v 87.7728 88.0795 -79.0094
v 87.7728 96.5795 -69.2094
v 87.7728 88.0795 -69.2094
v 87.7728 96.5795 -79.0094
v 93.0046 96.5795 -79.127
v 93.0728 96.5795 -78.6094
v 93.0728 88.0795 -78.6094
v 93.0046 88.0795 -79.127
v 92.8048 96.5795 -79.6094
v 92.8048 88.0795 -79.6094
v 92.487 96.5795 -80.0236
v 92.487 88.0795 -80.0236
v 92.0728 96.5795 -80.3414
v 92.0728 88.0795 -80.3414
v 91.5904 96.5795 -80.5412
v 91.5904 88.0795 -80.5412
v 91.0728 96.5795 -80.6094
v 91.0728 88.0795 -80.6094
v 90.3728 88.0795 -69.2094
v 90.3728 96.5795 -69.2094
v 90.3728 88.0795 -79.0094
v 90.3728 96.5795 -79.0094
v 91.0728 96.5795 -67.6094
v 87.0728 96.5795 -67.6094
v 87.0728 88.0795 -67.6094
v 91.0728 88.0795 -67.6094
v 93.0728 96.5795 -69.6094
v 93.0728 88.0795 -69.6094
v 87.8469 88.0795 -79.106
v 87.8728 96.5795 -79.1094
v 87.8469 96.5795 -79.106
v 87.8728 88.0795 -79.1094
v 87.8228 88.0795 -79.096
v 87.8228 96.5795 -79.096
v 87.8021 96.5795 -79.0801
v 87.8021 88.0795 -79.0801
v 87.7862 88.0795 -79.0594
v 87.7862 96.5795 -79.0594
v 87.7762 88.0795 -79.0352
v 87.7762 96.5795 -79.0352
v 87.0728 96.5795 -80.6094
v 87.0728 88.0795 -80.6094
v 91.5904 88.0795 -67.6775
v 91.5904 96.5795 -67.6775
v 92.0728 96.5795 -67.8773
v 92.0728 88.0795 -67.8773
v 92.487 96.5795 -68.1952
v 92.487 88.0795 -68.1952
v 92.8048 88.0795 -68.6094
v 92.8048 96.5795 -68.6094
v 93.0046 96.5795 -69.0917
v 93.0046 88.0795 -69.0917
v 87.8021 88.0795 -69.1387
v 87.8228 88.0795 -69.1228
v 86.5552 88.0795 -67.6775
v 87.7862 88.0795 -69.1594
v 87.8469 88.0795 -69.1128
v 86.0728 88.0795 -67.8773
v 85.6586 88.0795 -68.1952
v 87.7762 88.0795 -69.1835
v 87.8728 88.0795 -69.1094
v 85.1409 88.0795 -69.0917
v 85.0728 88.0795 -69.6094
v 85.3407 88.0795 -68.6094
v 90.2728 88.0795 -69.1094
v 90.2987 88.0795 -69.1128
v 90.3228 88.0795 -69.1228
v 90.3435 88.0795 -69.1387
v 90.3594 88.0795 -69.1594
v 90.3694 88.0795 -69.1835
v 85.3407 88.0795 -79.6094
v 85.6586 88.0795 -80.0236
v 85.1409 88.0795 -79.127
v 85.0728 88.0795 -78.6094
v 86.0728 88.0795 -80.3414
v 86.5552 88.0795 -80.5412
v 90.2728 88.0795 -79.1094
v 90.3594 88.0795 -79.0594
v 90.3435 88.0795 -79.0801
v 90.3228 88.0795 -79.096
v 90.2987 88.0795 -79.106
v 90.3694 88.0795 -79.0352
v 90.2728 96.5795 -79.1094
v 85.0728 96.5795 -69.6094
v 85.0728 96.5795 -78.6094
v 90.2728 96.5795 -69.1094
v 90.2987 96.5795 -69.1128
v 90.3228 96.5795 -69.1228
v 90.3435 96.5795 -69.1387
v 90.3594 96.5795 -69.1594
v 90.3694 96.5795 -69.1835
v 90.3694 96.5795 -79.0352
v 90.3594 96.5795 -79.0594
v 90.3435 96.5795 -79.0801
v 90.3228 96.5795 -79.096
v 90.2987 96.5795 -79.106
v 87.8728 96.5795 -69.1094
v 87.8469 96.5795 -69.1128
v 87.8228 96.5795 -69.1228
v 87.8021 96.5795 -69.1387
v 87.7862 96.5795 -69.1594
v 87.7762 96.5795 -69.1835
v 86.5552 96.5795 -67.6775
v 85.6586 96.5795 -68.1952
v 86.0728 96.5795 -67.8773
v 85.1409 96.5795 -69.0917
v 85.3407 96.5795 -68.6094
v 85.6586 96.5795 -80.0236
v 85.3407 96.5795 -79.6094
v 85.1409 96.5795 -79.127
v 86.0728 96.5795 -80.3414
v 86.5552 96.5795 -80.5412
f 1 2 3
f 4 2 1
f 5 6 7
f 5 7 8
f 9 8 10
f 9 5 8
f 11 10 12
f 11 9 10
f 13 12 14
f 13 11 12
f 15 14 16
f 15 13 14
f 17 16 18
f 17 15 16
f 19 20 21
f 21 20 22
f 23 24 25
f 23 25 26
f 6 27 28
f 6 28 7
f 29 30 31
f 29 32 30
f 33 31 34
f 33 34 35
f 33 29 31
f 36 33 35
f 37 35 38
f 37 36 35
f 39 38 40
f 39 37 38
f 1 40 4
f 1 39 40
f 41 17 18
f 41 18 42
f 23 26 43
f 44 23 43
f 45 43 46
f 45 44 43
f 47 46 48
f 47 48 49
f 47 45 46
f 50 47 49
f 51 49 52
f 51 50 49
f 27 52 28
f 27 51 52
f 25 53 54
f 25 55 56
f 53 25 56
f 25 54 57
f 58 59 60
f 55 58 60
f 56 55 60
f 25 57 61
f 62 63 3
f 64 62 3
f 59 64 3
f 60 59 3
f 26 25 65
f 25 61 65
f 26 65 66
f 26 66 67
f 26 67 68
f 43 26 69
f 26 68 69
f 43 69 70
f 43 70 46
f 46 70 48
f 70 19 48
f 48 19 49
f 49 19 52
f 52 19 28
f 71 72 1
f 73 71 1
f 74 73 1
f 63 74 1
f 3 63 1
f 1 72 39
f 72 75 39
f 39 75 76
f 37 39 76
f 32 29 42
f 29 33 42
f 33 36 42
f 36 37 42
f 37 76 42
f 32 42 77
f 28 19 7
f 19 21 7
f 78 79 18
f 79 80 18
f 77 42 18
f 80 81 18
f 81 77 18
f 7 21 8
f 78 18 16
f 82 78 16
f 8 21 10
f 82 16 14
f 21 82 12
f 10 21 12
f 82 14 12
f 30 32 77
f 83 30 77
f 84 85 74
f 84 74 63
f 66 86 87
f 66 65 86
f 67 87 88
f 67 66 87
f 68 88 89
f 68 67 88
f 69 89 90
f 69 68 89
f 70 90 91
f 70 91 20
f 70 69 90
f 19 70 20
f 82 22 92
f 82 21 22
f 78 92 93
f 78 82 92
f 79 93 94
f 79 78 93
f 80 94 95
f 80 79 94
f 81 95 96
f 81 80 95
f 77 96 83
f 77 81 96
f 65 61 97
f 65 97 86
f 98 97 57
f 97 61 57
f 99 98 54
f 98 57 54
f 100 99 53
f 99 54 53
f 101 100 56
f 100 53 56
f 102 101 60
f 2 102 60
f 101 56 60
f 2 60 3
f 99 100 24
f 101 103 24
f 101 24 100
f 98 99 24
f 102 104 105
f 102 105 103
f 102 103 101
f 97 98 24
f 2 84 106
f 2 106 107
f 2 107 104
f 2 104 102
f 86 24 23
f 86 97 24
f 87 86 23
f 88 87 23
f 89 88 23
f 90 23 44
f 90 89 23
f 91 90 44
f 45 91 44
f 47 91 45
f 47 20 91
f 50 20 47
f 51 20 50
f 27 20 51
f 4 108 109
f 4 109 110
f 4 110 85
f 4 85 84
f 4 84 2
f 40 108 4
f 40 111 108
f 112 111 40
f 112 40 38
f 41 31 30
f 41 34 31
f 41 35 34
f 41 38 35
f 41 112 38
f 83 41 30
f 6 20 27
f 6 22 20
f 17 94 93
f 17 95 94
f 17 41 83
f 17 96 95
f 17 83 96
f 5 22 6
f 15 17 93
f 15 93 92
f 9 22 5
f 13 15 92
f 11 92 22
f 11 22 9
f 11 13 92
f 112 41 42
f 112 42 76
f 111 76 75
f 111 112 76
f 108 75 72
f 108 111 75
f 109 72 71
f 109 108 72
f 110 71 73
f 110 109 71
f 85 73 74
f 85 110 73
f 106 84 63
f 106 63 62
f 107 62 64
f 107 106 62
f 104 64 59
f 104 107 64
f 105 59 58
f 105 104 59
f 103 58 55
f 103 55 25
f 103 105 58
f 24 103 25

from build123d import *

# Parameters (mm, degrees)
COIL_START = -0.7
SKETCH1_W  = 2.6
SKETCH1_H  = 10
COIL_DEPTH = 8.5
FILLET1_R  = 0.1


with BuildPart() as part:
    # Sketch1 → Coil (new body)
    with BuildSketch(Plane(origin=(0, 97.279475289, 0), x_dir=(1, 0, 0), z_dir=(0, 1, 0)).offset(COIL_START)):
        with BuildLine():
            Line((87.072792821, 67.609367759), (91.072792821, 67.609367759))
            ThreePointArc((91.072792821, 67.609367759), (92.487006384, 68.195154196), (93.072792821, 69.609367759))
            Line((93.072792821, 69.609367759), (93.072792821, 78.609367759))
            ThreePointArc((93.072792821, 78.609367759), (92.487006384, 80.023581321), (91.072792821, 80.609367759))
            Line((91.072792821, 80.609367759), (87.072792821, 80.609367759))
            ThreePointArc((87.072792821, 80.609367759), (85.658579259, 80.023581321), (85.072792821, 78.609367759))
            Line((85.072792821, 78.609367759), (85.072792821, 69.609367759))
            ThreePointArc((85.072792821, 69.609367759), (85.658579259, 68.195154196), (87.072792821, 67.609367759))
        make_face()
        with Locations((89.072792821, 74.109367759)):
            Rectangle(SKETCH1_W, SKETCH1_H, mode=Mode.SUBTRACT)
    extrude(amount=-COIL_DEPTH)

    # Fillet1
    fillet1_edges = [part.edges().sort_by_distance(p)[0] for p in [
        (90.372792821, 92.329475289, -79.109367759),
        (90.372792821, 92.329475289, -69.109367759),
        (87.772792821, 92.329475289, -69.109367759),
        (87.772792821, 92.329475289, -79.109367759),
    ]]
    fillet(fillet1_edges, radius=FILLET1_R)


solid = part.part
